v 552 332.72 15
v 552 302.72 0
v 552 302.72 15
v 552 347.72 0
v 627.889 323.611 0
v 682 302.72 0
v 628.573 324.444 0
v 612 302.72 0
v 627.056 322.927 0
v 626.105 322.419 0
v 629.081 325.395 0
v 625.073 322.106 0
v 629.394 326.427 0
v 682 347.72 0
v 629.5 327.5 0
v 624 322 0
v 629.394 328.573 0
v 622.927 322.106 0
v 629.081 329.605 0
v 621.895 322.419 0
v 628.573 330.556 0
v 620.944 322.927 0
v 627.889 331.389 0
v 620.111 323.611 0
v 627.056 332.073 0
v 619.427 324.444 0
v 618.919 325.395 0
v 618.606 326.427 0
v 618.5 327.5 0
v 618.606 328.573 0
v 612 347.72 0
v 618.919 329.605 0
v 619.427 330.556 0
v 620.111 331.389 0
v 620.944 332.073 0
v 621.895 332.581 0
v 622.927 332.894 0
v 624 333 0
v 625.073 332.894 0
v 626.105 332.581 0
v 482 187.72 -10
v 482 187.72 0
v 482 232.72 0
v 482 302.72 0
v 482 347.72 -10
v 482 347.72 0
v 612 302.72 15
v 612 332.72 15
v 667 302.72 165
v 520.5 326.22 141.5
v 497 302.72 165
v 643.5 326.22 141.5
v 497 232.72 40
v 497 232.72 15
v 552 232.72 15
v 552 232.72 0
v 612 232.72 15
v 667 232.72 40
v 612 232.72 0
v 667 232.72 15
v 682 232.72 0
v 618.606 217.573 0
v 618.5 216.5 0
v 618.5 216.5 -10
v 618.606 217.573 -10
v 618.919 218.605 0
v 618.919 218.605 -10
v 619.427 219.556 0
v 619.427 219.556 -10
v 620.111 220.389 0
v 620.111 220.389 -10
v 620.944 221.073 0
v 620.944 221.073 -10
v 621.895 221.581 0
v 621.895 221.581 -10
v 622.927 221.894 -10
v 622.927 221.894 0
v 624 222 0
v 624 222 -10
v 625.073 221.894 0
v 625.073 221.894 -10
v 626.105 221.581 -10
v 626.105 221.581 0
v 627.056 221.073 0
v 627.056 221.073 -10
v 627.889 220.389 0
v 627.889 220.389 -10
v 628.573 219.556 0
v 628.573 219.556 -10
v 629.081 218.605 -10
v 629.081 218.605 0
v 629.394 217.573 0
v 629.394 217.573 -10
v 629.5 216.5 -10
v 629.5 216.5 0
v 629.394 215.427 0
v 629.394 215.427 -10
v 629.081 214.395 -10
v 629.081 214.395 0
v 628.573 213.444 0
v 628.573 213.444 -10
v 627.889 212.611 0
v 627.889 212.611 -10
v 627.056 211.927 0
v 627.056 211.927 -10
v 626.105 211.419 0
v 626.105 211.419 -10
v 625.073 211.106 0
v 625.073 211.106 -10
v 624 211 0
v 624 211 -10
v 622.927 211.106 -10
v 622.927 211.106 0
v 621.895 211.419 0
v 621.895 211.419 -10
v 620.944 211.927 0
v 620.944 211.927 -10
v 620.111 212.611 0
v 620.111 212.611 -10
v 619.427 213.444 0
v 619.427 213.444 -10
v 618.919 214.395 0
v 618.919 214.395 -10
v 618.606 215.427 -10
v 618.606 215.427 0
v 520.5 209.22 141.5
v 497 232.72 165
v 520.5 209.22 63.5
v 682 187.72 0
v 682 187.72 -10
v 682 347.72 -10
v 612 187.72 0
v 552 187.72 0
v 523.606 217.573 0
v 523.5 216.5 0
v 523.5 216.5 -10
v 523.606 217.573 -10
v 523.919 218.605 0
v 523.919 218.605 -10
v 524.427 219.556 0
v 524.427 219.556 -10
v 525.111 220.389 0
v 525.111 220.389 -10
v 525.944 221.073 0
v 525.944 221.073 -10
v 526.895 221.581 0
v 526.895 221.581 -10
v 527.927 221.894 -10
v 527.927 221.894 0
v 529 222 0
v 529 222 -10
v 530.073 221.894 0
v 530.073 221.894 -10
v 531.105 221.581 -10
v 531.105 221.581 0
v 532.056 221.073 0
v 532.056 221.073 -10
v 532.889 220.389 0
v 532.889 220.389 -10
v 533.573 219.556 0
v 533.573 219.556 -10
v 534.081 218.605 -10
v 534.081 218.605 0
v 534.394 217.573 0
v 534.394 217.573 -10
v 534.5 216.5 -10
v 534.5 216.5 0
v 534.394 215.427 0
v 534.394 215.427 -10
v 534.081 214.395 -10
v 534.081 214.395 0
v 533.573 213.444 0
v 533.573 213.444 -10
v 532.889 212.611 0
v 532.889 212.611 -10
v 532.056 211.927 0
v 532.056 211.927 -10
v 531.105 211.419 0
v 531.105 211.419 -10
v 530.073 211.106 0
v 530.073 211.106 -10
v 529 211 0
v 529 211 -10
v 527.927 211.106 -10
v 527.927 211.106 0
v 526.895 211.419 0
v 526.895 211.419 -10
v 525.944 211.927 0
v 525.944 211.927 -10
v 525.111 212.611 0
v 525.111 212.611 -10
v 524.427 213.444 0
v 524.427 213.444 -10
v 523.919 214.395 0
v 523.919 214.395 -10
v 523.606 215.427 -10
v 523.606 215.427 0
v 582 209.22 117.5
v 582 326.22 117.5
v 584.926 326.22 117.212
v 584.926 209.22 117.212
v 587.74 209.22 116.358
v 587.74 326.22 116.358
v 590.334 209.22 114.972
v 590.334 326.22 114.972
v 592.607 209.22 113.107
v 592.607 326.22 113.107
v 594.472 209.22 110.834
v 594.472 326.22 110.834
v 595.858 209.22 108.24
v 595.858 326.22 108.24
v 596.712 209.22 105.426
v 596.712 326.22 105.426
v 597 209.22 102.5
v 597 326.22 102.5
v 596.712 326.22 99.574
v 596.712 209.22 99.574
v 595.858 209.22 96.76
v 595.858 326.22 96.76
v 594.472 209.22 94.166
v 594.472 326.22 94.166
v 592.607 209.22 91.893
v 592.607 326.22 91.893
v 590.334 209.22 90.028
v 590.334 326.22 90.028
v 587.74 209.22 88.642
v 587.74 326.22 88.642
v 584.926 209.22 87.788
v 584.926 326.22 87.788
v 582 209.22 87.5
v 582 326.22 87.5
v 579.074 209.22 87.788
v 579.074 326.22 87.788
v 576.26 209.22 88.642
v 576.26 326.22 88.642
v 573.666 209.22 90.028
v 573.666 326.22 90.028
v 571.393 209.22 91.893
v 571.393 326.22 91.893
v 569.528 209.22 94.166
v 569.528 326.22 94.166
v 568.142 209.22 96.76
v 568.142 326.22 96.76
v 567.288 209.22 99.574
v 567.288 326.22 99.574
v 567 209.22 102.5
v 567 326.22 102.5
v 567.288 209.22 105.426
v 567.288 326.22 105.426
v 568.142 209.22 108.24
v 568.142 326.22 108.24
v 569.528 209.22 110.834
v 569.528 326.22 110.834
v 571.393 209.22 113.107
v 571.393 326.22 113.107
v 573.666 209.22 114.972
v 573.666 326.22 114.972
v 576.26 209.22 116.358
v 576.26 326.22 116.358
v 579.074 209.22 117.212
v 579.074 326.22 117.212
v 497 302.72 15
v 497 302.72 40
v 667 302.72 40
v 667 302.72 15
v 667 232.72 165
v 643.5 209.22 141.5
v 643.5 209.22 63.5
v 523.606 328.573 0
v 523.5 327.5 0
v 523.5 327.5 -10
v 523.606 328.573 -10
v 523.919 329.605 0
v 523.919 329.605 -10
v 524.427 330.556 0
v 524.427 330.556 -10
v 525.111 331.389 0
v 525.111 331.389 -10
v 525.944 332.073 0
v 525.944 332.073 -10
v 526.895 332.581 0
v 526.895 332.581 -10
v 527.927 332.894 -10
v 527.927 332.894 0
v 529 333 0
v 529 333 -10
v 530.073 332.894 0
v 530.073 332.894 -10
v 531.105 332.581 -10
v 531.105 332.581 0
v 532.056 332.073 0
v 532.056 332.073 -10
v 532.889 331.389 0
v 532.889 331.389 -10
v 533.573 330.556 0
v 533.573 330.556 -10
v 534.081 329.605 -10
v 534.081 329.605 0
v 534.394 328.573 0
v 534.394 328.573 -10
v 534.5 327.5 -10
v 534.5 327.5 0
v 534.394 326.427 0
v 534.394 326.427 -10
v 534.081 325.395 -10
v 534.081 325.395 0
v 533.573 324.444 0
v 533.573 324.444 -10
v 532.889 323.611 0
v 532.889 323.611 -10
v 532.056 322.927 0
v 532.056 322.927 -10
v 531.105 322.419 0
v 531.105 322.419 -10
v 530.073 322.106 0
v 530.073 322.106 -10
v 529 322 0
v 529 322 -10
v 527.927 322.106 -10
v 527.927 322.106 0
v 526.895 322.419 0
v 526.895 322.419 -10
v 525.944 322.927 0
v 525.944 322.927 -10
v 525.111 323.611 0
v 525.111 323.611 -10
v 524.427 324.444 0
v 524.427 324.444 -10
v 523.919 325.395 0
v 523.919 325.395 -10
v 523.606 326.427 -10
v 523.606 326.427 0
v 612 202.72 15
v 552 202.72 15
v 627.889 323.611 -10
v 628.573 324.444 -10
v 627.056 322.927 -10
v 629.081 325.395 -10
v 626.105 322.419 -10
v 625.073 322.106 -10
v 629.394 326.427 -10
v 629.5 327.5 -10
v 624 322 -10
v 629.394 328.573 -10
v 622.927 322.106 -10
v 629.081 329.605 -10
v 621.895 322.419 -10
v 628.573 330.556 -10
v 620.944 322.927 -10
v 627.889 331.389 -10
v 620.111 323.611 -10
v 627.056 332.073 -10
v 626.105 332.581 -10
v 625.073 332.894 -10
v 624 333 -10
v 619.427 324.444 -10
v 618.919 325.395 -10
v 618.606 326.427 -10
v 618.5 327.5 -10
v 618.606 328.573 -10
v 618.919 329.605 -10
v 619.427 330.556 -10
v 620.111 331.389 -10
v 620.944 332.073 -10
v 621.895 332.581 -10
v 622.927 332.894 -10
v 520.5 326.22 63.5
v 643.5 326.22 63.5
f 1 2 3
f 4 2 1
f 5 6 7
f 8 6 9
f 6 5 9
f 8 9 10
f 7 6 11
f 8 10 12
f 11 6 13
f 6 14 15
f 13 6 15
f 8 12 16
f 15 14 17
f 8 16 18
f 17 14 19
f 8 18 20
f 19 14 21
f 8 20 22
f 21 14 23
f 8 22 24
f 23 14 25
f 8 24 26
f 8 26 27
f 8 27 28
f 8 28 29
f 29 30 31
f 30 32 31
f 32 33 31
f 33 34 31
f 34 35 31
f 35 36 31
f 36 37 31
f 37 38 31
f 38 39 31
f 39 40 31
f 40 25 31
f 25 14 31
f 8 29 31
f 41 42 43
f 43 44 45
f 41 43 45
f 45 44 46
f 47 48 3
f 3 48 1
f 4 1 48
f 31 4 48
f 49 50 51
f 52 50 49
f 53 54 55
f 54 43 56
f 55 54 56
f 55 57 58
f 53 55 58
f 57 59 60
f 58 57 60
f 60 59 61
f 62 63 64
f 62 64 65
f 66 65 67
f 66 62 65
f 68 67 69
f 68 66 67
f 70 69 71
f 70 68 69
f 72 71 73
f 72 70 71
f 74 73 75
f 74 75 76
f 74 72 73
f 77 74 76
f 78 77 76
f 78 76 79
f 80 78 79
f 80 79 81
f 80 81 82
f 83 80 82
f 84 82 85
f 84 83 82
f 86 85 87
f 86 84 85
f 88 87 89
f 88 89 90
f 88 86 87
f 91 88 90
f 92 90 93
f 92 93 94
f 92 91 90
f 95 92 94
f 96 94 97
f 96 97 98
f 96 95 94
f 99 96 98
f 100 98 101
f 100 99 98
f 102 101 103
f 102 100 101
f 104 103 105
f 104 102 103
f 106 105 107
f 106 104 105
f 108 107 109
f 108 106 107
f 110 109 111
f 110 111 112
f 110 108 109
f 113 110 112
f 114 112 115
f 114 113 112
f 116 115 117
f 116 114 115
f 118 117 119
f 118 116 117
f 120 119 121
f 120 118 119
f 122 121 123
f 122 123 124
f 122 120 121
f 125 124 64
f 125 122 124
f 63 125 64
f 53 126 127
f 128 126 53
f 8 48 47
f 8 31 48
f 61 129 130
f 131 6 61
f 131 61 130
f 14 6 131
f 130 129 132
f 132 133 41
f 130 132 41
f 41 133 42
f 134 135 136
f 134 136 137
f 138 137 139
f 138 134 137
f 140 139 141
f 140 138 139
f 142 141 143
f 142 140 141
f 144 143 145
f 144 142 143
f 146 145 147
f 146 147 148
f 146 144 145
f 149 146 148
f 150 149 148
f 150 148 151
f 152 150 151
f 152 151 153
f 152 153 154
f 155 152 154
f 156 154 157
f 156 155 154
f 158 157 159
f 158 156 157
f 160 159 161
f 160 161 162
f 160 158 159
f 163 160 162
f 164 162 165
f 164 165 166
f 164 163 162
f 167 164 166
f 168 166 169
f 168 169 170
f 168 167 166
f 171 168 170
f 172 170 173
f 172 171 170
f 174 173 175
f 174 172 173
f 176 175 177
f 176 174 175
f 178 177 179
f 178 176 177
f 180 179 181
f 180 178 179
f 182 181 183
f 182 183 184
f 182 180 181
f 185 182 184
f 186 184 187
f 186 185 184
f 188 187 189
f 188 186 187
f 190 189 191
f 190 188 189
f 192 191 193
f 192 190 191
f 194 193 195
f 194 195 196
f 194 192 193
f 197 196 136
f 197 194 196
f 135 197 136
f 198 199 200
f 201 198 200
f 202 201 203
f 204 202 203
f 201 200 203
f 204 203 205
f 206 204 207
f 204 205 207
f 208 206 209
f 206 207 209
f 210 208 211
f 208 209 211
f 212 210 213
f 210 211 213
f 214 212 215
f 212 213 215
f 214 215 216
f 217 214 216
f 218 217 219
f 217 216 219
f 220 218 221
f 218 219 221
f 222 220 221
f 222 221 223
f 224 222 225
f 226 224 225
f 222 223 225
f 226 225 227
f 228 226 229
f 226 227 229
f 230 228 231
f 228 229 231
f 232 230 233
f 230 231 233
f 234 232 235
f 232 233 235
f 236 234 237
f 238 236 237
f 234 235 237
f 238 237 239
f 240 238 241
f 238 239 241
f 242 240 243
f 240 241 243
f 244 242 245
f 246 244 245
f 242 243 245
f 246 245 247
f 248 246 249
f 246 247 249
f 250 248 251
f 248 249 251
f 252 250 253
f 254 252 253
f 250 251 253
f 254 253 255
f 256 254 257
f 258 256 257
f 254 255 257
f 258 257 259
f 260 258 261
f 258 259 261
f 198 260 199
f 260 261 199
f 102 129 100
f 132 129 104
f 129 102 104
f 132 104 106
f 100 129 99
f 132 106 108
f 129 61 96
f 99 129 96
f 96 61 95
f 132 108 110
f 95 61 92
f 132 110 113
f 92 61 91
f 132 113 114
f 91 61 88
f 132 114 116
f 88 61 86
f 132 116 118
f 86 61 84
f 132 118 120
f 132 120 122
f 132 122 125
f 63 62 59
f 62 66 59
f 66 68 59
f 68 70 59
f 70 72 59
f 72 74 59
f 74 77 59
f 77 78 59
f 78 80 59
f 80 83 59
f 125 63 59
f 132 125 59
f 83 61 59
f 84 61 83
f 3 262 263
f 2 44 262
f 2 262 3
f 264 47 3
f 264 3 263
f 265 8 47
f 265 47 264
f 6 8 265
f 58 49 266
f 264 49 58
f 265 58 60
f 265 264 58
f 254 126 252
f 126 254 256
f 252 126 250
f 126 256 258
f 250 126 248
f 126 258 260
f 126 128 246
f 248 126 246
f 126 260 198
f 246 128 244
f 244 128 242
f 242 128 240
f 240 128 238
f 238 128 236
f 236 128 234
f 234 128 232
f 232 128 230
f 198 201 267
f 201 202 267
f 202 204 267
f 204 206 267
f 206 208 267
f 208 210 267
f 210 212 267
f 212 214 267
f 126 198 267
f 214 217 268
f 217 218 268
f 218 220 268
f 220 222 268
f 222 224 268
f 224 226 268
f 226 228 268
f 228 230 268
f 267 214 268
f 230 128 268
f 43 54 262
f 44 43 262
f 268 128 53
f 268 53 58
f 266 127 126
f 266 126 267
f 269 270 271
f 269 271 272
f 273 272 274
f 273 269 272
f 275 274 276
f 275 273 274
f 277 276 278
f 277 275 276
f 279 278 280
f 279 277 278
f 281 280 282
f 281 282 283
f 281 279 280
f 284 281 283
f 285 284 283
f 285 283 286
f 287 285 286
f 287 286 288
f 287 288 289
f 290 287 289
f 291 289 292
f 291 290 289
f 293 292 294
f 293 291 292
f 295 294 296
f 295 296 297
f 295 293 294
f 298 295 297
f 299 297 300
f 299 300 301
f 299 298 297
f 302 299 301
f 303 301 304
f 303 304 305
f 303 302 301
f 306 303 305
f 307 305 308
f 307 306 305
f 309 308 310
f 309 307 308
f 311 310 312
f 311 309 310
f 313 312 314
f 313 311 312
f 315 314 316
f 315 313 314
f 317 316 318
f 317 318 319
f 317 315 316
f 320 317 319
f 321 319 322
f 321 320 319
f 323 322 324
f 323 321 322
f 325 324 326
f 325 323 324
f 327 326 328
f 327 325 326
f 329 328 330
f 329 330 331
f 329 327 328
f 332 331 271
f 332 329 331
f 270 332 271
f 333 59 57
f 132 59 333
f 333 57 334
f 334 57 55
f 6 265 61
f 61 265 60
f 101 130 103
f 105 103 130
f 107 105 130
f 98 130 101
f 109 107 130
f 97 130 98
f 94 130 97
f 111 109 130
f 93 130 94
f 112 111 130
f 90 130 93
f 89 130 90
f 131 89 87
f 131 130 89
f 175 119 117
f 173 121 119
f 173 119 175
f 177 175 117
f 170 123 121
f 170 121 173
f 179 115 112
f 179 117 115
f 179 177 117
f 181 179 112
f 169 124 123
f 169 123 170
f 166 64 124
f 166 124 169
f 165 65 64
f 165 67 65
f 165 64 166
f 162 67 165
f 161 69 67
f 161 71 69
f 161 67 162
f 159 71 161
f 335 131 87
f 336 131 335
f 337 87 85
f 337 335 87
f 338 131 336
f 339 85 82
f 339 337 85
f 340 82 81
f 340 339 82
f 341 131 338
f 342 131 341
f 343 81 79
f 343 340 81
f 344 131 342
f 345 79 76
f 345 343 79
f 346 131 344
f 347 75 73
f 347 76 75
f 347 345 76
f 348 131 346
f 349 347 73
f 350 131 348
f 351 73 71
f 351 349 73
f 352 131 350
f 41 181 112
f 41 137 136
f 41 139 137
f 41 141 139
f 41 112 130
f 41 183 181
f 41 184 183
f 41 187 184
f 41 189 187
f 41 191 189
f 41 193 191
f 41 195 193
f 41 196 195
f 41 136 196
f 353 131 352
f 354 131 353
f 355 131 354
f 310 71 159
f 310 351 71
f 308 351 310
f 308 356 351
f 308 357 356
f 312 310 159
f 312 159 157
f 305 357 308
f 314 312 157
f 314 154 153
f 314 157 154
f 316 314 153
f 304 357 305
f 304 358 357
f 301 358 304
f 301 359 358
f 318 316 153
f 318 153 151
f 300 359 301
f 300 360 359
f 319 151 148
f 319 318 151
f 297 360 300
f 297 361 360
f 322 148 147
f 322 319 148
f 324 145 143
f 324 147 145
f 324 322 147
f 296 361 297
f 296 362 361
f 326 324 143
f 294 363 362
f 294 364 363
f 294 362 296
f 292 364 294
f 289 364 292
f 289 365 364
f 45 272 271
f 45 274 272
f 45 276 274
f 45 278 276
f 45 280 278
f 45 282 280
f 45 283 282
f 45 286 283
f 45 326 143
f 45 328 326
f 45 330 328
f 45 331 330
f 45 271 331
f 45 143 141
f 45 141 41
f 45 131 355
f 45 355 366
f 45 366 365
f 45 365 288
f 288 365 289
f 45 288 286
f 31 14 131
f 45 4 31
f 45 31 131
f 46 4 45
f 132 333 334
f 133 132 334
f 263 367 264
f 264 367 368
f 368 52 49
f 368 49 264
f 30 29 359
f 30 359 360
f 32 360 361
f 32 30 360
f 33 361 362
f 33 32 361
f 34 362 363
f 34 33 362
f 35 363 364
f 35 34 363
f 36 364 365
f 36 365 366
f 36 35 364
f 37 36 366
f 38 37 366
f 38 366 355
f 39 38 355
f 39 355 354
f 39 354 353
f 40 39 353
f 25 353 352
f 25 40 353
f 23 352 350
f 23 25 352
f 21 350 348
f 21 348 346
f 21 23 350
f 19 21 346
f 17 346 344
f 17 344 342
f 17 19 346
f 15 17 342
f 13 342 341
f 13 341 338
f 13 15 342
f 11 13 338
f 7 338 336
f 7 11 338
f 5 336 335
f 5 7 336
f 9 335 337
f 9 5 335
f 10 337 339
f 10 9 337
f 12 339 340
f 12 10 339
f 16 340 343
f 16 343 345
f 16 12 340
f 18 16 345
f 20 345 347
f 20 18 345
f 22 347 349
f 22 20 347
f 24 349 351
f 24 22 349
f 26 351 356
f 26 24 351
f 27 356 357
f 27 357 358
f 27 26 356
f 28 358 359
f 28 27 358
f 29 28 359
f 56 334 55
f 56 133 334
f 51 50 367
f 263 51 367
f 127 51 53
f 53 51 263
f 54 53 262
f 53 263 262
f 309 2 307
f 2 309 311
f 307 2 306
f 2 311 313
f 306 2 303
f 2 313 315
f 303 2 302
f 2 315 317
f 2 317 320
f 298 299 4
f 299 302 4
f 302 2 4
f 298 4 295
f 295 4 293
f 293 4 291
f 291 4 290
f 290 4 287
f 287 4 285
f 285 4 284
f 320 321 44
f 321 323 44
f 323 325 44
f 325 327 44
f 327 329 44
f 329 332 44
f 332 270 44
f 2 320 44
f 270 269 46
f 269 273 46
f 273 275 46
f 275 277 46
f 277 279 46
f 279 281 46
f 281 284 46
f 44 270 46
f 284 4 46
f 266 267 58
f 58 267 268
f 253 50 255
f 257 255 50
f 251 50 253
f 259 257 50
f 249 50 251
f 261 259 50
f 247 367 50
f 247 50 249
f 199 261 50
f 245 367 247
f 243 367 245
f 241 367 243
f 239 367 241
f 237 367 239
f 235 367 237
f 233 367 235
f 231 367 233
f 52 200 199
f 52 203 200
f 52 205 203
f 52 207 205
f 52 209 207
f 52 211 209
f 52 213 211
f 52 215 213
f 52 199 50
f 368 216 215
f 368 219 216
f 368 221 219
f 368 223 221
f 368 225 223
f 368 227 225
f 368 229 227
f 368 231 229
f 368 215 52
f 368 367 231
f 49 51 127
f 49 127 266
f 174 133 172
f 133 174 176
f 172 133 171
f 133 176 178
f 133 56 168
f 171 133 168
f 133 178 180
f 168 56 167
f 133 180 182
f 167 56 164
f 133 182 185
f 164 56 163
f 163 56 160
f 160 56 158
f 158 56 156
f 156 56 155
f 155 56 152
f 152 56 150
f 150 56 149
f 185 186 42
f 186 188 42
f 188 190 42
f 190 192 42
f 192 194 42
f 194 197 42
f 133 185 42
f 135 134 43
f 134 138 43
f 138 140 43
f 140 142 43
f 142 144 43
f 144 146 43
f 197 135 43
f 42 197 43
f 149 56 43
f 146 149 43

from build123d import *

# Parameters (mm, degrees)
SCHIZZO21_W                  = 200
SCHIZZO21_H                  = 160
SCHIZZO21_R                  = 5.5
ESTRUSIONE_ESTRUSIONE1_DEPTH = 10
ESTRUSIONE_ESTRUSIONE2_DEPTH = 15
SMUSSO1_SIZE                 = 15
SCHIZZO23_W                  = 170
SCHIZZO23_H                  = 70
ESTRUSIONE_ESTRUSIONE3_DEPTH = 150
SCHIZZO24_W                  = 170
SCHIZZO24_H                  = 125
ESTRUSIONE_ESTRUSIONE4_DEPTH = 23.5
SMUSSO5_SIZE                 = 23.5
SMUSSO5_OF_SPECCHIA1_SIZE    = 23.5
SCHIZZO26_R                  = 15
TAGLIO_ESTRUSIONE1_DEPTH     = 117


with BuildPart() as part:
    # Schizzo21 → Estrusione-Estrusione1 (new body)
    with BuildSketch(Plane(origin=(0, 0, 0), x_dir=(-1, 0, 0), z_dir=(0, 0, -1))):
        with Locations((-582, 267.72)):
            Rectangle(SCHIZZO21_W, SCHIZZO21_H)
        with Locations((-529, 327.5)):
            Circle(SCHIZZO21_R, mode=Mode.SUBTRACT)
        with Locations((-529, 216.5)):
            Circle(SCHIZZO21_R, mode=Mode.SUBTRACT)
        with Locations((-624, 216.5)):
            Circle(SCHIZZO21_R, mode=Mode.SUBTRACT)
        with Locations((-624, 327.5)):
            Circle(SCHIZZO21_R, mode=Mode.SUBTRACT)
    extrude(amount=ESTRUSIONE_ESTRUSIONE1_DEPTH)

    # Schizzo22 → Estrusione-Estrusione2 (add)
    with BuildSketch(Plane.XY):
        Polygon((482, 302.72), (552, 302.72), (552, 347.72), (612, 347.72), (612, 302.72), (682, 302.72), (682, 232.72), (612, 232.72), (612, 187.72), (552, 187.72), (552, 232.72), (482, 232.72), align=None)
    extrude(amount=ESTRUSIONE_ESTRUSIONE2_DEPTH)

    # Smusso1
    smusso1_edges = [part.edges().sort_by_distance(p)[0] for p in [
        (682, 267.72, 15),
        (582, 347.72, 15),
        (582, 187.72, 15),
        (482, 267.72, 15),
    ]]
    chamfer(smusso1_edges, length=SMUSSO1_SIZE)

    # Schizzo23 → Estrusione-Estrusione3 (add)
    with BuildSketch(Plane.XY.offset(15)):
        with Locations((582, 267.72)):
            Rectangle(SCHIZZO23_W, SCHIZZO23_H)
    extrude(amount=ESTRUSIONE_ESTRUSIONE3_DEPTH)

    # Schizzo24 → Estrusione-Estrusione4 (add)
    with BuildSketch(Plane(origin=(0, 302.72, 0), x_dir=(1, 0, 0), z_dir=(0, 1, 0))):
        with Locations((582, -102.5)):
            Rectangle(SCHIZZO24_W, SCHIZZO24_H)
    estrusione_estrusione4 = extrude(amount=ESTRUSIONE_ESTRUSIONE4_DEPTH)

    # Smusso5
    smusso5_edges = [part.edges().sort_by_distance(p)[0] for p in [
        (667, 326.22, 102.5),
        (582, 326.22, 40),
        (582, 326.22, 165),
        (497, 326.22, 102.5),
    ]]
    chamfer(smusso5_edges, length=SMUSSO5_SIZE - 0.0001)  # a hair under: the kernel refuses the full size

    # Specchia1: Estrusione-Estrusione4 across plane
    add(estrusione_estrusione4.mirror(Plane(origin=(0, 267.72, 0), x_dir=(0, 0, 1), z_dir=(0, -1, 0))))

    # Smusso5 of Specchia1
    smusso5_of_specchia1_edges = [part.edges().sort_by_distance(p)[0] for p in [
        (667, 209.22, 102.5),
        (582, 209.22, 40),
        (582, 209.22, 165),
        (497, 209.22, 102.5),
    ]]
    chamfer(smusso5_of_specchia1_edges, length=SMUSSO5_OF_SPECCHIA1_SIZE - 0.0001)  # a hair under: the kernel refuses the full size

    # Schizzo26 → Taglio-Estrusione1 (cut)
    with BuildSketch(Plane(origin=(0, 326.22, 0), x_dir=(1, 0, 0), z_dir=(0, 1, 0))):
        with Locations(Location((582, -102.5, 0), (0, 0, 270))):
            Circle(SCHIZZO26_R)
    extrude(amount=-TAGLIO_ESTRUSIONE1_DEPTH, mode=Mode.SUBTRACT)


solid = part.part
